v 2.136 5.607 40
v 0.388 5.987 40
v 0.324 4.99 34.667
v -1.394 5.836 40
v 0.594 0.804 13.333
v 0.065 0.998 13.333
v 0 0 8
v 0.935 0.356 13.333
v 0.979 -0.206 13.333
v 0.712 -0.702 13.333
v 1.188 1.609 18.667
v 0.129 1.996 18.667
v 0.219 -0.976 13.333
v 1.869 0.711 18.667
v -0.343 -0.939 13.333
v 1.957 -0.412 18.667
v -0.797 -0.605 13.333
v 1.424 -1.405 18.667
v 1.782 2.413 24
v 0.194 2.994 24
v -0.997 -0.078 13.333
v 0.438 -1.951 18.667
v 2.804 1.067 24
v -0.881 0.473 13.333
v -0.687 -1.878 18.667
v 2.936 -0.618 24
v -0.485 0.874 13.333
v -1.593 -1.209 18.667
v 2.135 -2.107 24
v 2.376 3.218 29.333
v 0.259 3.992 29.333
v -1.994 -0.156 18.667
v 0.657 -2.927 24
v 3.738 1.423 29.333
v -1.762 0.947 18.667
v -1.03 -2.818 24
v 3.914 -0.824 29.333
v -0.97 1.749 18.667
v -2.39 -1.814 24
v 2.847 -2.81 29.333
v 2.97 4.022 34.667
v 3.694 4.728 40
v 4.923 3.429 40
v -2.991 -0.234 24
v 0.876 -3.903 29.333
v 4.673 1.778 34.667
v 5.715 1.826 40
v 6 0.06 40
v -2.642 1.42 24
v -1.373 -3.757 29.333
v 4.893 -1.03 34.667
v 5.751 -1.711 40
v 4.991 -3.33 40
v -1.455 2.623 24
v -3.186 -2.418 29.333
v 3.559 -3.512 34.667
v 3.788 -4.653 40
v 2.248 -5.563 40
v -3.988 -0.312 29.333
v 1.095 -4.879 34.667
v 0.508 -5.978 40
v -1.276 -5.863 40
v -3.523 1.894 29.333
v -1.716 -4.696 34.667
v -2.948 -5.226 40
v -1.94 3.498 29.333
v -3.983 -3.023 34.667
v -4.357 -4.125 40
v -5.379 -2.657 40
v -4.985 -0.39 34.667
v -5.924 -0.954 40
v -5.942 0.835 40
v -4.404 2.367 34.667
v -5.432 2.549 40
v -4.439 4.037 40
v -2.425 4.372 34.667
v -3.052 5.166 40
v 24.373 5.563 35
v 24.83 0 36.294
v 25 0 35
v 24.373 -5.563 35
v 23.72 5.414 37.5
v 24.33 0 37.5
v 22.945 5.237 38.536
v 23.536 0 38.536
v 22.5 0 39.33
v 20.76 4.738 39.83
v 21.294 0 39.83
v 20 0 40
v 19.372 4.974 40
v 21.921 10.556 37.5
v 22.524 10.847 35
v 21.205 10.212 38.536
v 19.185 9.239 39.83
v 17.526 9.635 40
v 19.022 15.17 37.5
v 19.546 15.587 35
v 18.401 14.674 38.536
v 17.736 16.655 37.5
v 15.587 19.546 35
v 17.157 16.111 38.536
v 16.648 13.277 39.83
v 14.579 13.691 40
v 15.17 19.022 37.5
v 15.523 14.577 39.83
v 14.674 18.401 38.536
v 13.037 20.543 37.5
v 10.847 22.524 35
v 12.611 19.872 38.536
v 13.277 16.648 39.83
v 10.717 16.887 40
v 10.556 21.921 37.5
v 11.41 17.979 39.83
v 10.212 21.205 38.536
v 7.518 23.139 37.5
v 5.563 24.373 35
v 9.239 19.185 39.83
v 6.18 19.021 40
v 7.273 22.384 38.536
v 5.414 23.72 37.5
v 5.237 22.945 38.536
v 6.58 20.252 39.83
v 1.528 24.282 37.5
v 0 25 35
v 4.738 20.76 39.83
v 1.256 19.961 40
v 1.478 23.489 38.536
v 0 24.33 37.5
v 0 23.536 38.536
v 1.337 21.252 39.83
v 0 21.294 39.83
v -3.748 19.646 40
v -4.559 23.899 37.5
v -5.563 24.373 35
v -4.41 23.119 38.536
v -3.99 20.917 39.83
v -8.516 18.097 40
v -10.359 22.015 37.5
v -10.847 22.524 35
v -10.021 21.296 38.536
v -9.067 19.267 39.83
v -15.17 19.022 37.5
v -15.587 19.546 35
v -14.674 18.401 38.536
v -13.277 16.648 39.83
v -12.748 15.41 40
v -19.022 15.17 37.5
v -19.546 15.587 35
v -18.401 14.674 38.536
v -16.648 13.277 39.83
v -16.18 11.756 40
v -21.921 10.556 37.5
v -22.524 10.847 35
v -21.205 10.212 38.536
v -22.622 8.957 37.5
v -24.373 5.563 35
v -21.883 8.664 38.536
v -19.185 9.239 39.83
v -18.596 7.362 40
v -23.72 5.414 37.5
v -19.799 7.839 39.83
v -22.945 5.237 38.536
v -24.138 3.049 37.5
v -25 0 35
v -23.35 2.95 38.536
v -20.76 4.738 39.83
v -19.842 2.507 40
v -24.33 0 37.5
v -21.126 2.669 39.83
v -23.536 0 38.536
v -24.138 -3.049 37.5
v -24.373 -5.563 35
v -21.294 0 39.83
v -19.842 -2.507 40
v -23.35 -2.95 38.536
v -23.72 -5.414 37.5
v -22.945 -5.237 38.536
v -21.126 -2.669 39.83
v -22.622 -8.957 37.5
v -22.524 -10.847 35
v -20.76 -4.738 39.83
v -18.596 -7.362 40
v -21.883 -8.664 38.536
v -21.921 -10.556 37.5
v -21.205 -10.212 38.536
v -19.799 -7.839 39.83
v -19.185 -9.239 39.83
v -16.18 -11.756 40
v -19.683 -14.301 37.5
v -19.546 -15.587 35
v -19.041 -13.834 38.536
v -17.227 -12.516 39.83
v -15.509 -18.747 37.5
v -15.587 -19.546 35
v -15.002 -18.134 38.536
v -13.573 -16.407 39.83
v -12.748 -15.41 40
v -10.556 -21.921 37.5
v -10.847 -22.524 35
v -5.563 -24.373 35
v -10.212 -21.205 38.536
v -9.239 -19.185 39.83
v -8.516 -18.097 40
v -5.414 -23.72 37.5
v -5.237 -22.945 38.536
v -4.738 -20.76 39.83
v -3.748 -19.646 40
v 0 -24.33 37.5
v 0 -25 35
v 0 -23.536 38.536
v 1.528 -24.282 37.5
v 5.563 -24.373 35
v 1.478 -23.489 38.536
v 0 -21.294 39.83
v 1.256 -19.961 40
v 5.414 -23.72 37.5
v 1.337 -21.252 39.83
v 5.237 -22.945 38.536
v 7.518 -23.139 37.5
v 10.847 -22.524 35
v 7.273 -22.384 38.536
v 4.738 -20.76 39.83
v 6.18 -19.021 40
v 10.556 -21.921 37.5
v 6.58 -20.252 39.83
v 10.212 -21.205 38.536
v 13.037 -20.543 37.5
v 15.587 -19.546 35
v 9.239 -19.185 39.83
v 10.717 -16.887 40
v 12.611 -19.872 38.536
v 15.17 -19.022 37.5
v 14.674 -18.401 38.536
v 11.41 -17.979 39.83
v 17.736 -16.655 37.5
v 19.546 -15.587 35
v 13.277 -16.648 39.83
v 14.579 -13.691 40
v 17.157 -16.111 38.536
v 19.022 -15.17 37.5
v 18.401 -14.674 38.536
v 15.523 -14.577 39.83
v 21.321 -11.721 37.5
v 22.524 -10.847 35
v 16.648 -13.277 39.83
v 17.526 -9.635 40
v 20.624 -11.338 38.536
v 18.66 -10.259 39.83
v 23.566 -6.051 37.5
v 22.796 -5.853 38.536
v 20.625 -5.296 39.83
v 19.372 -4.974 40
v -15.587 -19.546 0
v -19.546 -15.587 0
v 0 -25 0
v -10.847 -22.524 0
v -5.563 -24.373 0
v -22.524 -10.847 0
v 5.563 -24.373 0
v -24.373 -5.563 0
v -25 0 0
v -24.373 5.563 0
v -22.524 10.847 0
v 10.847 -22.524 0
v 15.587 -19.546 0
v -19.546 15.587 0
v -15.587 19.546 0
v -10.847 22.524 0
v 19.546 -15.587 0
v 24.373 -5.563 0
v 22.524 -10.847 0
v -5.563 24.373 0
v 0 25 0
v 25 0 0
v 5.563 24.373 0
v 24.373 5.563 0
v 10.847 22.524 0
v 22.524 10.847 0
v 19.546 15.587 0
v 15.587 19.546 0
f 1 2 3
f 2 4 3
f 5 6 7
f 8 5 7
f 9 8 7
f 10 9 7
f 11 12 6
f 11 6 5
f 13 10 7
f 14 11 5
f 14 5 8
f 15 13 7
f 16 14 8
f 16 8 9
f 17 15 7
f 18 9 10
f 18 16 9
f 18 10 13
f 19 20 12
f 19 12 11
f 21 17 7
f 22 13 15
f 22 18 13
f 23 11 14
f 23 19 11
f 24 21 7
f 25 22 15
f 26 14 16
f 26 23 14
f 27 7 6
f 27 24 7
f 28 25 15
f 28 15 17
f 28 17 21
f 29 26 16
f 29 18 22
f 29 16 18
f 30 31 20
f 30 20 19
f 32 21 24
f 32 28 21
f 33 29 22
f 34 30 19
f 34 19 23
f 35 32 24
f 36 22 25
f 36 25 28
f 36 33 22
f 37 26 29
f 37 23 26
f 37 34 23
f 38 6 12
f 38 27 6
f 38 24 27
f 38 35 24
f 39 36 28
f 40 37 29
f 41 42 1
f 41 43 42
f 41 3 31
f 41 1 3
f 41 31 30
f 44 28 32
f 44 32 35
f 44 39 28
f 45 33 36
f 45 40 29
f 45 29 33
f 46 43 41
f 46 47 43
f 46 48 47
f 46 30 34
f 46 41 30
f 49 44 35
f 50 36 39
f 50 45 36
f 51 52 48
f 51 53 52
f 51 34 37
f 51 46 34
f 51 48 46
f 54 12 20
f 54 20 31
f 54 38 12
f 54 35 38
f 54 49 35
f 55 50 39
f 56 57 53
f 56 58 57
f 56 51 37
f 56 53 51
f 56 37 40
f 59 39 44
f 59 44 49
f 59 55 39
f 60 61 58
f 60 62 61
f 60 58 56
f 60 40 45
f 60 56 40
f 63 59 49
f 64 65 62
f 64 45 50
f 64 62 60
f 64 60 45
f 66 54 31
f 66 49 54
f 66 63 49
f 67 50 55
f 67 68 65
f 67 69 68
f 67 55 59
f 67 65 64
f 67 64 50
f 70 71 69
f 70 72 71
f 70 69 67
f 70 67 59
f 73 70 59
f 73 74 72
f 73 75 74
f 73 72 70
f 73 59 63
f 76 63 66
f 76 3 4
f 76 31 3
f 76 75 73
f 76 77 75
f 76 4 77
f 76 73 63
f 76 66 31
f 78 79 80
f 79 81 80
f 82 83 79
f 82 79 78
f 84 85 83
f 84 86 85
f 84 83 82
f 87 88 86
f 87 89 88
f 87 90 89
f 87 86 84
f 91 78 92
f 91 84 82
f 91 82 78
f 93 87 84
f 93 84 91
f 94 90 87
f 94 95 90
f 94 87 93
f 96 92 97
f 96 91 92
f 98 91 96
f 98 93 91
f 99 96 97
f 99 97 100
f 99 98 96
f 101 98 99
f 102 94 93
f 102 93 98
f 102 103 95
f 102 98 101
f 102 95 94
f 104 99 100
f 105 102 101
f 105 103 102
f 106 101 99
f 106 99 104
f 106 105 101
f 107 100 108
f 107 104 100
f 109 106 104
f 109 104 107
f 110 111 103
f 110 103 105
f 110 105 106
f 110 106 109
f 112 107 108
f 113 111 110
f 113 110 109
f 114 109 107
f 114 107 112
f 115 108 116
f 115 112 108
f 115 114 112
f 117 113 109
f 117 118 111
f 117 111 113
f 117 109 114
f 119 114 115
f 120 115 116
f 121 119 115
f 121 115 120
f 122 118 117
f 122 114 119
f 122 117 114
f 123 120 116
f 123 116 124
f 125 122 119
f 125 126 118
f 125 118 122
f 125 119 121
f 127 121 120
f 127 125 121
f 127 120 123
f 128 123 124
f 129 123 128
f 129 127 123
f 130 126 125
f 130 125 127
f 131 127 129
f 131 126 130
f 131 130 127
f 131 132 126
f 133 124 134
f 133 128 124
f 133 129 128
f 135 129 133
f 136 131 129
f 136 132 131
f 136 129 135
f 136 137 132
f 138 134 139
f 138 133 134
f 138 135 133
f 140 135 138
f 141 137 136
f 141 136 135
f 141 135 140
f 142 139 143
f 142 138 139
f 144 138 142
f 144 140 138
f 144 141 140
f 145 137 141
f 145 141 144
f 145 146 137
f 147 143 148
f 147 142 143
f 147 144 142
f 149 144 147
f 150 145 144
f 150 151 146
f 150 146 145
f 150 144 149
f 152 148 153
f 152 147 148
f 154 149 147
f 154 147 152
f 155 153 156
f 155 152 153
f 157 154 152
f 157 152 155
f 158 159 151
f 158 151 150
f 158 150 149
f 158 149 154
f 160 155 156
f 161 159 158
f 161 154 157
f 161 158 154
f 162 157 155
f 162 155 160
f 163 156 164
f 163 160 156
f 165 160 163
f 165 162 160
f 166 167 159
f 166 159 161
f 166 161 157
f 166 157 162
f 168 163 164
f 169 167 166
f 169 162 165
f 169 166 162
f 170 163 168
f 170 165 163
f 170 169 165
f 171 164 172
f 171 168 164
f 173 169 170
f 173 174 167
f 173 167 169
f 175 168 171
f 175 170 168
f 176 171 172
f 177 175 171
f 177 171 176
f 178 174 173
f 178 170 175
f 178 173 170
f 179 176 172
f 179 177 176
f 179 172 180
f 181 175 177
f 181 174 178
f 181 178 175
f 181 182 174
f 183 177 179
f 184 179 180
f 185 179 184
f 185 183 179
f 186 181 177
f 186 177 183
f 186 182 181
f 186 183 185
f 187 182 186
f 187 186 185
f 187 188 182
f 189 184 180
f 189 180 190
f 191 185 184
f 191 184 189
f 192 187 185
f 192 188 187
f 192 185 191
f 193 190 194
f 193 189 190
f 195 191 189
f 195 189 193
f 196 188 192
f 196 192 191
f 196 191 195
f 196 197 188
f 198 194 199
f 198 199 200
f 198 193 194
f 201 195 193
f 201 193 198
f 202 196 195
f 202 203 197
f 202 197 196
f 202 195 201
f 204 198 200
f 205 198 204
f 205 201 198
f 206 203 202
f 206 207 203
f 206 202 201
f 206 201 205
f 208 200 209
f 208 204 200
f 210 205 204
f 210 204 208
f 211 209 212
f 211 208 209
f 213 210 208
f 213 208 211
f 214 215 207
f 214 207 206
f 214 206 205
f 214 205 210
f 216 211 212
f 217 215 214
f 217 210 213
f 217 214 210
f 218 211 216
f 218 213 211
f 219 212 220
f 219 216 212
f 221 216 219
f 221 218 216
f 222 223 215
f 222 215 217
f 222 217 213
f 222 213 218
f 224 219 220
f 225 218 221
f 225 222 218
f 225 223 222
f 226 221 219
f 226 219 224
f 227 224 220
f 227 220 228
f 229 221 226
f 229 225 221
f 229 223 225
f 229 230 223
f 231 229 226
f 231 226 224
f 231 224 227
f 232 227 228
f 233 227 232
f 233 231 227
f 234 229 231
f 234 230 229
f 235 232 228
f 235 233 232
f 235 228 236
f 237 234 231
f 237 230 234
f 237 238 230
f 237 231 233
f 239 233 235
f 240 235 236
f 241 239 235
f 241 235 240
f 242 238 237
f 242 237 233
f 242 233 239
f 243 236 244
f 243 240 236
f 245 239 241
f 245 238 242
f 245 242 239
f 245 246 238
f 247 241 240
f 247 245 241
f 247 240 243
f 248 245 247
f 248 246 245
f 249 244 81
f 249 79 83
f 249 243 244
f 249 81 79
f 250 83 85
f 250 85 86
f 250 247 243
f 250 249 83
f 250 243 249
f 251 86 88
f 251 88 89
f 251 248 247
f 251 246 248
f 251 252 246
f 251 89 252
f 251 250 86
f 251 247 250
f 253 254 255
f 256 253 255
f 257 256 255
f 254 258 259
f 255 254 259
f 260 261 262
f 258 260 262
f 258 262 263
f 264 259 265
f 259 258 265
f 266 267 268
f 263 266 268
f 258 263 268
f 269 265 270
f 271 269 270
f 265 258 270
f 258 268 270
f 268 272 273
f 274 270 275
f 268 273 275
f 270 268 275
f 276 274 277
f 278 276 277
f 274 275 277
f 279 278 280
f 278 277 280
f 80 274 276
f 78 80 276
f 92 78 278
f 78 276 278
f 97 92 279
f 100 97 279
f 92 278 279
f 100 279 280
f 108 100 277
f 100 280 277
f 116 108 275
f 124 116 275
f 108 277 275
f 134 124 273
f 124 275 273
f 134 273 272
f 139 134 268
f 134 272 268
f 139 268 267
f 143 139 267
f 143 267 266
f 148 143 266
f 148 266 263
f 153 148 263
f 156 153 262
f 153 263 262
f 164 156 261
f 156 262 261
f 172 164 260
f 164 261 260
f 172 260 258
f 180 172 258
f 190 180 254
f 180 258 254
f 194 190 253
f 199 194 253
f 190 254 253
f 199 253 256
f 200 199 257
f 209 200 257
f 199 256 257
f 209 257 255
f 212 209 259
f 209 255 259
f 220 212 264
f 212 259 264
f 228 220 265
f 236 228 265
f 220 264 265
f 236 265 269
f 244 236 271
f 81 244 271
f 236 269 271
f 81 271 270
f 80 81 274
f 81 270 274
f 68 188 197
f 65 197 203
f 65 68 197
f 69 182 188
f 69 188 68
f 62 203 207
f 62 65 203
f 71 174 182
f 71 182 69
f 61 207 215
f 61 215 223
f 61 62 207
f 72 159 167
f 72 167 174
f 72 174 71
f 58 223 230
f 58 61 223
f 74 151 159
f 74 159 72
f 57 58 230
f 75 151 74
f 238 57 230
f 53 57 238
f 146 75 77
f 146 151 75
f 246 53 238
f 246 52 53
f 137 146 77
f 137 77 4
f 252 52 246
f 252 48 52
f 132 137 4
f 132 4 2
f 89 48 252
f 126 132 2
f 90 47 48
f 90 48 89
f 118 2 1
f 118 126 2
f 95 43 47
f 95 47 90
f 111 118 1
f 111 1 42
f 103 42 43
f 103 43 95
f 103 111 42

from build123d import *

# Parameters (mm, degrees)
F0_R     = 25
F1_DEPTH = 40
F6_R     = 5


with BuildPart() as f1:
    # F0 (on Top) → F1 (new body)
    with BuildSketch(Plane.XY):
        Circle(F0_R)
    extrude(amount=F1_DEPTH)

    # F4 (on 3pt) → F5 (revolve, cut)
    with BuildSketch(Plane(origin=(0, 0, 0), x_dir=(0.0647328202, 0.9979026315, 0), z_dir=(0.9979026315, -0.0647328202, 0))):
        Polygon((6, 40), (0, 40), (0, 8), align=None)
    revolve(axis=Axis((0, 0, 24), (0, 0, -1)), mode=Mode.SUBTRACT)

    # F6
    f6_edges = [f1.edges().sort_by_distance(p)[0] for p in [
        (-25, 0, 40),
    ]]
    fillet(f6_edges, radius=F6_R)


solid = f1.part
